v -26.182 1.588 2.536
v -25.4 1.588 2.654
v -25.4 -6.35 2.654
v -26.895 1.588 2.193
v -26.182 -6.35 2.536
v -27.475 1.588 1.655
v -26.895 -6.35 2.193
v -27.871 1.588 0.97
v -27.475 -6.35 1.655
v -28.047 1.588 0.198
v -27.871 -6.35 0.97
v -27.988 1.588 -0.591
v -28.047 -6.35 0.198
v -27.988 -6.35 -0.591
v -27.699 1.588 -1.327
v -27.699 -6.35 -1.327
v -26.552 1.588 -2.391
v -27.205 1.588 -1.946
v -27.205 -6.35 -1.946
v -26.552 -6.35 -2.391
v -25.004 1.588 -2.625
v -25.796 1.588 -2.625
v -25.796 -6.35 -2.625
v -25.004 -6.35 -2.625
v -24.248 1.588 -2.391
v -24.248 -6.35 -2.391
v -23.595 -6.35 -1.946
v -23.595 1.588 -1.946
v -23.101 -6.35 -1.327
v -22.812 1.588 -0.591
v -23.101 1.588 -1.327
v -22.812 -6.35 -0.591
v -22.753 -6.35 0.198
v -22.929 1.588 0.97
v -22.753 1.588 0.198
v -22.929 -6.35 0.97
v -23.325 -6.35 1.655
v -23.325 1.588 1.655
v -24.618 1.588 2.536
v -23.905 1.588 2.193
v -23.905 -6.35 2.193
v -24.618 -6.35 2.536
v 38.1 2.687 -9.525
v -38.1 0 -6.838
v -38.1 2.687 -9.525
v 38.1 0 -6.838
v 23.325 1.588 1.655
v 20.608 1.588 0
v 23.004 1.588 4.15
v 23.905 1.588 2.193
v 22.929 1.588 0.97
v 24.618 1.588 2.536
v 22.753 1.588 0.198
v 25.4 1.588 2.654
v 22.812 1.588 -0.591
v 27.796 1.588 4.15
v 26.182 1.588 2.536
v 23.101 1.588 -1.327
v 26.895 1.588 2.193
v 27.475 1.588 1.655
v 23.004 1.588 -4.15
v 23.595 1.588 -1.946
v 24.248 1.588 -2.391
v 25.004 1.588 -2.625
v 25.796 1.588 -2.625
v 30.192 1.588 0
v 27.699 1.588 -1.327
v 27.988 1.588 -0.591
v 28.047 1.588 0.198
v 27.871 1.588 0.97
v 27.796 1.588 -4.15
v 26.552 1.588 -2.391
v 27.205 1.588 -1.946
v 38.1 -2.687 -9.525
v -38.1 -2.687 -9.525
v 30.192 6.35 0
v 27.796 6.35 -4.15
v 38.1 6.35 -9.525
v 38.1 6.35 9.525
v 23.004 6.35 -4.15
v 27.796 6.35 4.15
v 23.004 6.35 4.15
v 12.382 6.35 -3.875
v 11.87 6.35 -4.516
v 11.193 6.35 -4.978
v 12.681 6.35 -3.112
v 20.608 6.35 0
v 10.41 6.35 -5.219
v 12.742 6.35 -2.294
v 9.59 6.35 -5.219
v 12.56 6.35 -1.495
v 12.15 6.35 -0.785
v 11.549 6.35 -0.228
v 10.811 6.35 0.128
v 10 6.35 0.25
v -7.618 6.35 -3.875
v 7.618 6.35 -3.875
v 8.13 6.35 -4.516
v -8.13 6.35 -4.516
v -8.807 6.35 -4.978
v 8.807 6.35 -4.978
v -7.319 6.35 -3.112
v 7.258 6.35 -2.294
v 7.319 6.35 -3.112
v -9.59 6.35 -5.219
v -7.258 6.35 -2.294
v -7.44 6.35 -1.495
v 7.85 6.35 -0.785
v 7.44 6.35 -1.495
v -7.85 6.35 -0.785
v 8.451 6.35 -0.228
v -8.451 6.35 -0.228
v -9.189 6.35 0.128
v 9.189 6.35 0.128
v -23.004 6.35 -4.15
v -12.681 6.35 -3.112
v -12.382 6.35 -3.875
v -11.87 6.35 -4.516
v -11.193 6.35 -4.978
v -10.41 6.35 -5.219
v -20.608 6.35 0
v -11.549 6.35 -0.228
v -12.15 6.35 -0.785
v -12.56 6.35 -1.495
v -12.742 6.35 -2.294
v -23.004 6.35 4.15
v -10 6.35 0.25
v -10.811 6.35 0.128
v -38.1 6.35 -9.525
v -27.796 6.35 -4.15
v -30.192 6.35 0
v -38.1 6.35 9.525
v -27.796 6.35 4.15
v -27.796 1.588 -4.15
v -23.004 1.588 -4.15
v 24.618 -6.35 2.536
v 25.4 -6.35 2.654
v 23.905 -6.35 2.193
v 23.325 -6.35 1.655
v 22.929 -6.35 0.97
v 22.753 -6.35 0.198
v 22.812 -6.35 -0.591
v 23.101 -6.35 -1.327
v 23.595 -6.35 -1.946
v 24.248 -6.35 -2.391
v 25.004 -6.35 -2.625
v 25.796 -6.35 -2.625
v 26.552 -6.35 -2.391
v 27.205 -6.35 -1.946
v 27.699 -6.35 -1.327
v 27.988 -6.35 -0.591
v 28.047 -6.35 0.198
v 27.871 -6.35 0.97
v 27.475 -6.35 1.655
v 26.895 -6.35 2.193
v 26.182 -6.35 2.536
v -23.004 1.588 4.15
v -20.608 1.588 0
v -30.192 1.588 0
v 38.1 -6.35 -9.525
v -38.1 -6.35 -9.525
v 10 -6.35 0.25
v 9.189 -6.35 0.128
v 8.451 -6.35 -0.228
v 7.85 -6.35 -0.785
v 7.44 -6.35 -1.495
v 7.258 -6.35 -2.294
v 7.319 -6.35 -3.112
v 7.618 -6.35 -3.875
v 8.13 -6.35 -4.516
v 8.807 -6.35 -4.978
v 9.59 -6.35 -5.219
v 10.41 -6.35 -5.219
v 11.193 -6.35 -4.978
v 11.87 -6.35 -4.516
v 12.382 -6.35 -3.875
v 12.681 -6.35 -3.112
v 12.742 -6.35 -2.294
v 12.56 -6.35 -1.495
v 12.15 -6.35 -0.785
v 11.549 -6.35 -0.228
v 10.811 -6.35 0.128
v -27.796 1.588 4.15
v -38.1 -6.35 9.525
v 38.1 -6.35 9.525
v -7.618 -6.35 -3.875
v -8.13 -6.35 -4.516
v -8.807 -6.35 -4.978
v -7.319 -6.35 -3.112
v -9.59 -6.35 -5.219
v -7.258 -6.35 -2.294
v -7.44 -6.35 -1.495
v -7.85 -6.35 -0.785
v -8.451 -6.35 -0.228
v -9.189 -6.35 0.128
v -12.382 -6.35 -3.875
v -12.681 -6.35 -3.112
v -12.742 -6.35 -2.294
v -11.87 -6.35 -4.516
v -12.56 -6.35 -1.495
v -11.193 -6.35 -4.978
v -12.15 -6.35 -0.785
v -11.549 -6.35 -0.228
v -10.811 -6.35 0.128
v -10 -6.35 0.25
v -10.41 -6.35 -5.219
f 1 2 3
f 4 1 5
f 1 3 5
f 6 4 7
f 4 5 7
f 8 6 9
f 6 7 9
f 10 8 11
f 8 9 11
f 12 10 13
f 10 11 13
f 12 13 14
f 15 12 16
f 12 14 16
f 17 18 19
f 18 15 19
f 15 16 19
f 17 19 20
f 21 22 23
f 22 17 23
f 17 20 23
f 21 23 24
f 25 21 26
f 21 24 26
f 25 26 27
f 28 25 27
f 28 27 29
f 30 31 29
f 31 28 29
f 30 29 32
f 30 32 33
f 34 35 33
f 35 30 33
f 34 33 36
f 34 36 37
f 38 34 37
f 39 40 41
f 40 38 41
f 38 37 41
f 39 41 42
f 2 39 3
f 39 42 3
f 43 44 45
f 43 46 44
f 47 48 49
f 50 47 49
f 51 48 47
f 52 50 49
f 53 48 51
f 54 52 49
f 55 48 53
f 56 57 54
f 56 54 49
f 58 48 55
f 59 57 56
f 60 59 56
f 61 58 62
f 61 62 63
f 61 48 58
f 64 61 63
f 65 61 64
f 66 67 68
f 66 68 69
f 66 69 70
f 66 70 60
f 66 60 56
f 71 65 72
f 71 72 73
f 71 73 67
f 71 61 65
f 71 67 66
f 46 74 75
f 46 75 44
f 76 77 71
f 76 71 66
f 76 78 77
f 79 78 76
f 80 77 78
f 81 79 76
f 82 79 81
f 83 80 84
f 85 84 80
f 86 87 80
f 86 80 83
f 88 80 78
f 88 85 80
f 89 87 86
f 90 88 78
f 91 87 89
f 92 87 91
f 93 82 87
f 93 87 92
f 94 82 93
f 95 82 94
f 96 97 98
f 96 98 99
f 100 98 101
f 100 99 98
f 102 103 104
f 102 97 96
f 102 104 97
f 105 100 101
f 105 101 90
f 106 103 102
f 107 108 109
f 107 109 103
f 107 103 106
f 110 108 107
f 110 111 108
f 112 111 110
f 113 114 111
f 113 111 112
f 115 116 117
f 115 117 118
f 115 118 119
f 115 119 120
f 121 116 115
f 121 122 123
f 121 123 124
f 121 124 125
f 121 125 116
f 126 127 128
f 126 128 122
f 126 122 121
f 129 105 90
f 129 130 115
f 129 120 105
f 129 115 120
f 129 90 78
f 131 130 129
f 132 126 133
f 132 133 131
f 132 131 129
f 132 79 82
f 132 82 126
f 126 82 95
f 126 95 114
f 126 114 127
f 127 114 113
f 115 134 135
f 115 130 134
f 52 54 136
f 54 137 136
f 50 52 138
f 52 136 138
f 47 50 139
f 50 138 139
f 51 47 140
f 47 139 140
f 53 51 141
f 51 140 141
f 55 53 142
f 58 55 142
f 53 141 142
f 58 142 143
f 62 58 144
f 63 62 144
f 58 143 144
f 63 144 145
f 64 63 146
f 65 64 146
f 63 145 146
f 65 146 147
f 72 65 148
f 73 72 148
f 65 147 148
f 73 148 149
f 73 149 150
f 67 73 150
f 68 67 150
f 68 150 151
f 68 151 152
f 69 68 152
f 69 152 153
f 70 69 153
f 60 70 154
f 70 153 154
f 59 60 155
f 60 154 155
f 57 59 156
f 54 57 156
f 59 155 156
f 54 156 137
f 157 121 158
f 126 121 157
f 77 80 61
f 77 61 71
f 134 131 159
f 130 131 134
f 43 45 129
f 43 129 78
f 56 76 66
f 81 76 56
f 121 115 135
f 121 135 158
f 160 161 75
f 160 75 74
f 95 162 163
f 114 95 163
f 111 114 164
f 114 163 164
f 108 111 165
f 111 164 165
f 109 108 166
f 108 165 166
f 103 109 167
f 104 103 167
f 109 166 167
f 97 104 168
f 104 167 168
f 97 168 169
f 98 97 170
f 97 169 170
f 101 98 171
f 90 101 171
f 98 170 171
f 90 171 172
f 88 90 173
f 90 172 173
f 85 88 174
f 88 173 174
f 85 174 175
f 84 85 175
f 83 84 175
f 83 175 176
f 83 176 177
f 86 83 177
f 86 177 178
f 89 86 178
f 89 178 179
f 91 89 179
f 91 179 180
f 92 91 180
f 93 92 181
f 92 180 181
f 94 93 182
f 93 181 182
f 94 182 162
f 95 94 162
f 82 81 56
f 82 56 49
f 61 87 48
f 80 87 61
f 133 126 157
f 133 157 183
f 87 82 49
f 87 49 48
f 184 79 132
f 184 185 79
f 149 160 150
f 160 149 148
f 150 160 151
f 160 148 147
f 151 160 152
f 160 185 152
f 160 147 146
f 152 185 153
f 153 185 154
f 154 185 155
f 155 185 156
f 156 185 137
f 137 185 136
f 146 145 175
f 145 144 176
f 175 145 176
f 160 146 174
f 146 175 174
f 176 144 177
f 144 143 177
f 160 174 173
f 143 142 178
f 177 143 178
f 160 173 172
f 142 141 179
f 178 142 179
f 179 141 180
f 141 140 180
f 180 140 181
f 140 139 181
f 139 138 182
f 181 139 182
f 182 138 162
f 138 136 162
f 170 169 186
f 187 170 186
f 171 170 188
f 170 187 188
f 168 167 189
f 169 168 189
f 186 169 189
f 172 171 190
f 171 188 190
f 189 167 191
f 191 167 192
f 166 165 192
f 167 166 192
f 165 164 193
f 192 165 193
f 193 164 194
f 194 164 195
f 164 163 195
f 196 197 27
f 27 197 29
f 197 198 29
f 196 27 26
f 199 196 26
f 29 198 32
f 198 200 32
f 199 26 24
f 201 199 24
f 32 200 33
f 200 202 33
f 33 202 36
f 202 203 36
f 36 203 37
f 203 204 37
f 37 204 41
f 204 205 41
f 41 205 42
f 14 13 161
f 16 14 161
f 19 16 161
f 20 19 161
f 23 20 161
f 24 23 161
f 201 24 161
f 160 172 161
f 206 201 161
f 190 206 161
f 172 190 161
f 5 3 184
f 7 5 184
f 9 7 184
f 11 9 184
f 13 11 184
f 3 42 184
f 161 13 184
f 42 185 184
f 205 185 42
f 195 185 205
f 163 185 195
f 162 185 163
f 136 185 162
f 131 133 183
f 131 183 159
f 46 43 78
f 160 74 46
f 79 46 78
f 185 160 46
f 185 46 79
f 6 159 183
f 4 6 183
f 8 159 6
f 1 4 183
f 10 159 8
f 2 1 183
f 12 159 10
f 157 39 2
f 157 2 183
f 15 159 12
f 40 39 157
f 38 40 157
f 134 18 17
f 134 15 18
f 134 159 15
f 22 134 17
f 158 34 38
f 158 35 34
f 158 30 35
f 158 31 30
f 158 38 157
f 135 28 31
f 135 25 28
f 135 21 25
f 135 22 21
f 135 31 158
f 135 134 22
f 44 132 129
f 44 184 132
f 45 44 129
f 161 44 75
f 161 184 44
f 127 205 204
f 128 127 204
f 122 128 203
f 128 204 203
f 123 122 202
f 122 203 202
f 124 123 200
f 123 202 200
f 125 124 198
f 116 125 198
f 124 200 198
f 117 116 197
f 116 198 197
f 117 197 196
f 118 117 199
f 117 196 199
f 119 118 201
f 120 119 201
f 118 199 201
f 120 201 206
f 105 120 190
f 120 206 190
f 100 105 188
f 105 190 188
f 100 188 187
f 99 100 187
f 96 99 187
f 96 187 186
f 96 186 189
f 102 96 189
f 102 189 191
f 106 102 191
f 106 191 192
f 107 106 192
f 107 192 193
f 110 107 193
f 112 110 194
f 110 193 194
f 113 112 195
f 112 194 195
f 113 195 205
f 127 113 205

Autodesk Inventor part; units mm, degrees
ref_plane "YZ Plane" through (0, 0, 0) normal (1, 0, 0) x (0, 1, 0)
ref_plane "XZ Plane" through (0, 0, 0) normal (0, 1, 0) x (-1, 0, 0)
ref_plane "XY Plane" through (0, 0, 0) normal (0, 0, 1) x (1, 0, 0)
sketch "Sketch1" plane through (0, 0, 0) normal (0, 1, 0) x (-1, 0, 0)
  line L0 (-38.1, 9.525) -> (38.1, 9.525)
  line L1 (38.1, 9.525) -> (38.1, -9.525)
  line L2 (38.1, -9.525) -> (-38.1, -9.525)
  line L3 (-38.1, -9.525) -> (-38.1, 9.525)
  line L4 (-38.1, 9.525) -> (38.1, -9.525) construction
  line L5 (38.1, 9.525) -> (-38.1, -9.525) construction
  point P0 (0, 0)
  dimension "d0" = 76.2
  dimension "d1" = 19.05
extrude "Extrusion1" add sketch "Sketch1" along normal mid plane 12.7
sketch "Sketch2" plane through (38.1, -6.35, -9.525) normal (1, 0, 0) x (0, 0, -1)
  line L0 (0, 3.663) -> (-2.687, 6.35)
  line L1 (-2.687, 6.35) -> (0, 9.037)
  line L2 (0, 9.037) -> (2.687, 6.35)
  line L3 (2.687, 6.35) -> (0, 3.663)
  line L4 (-19.05, 12.7) -> (0, 12.7) projected
  line L5 (0, 12.7) -> (0, 0) projected
  point P0 (-9.525, 6.35)
  point P1 (0, 6.35)
  dimension "d4" = 45
  dimension "d5" = 3.8
extrude "Extrusion2" cut sketch "Sketch2" against normal through all
sketch "Sketch5" plane through (0, 6.35, 0) normal (0, 1, 0) x (1, 0, 0)
  line L0 (-38.1, 9.525) -> (-38.1, -9.525) projected
  line L1 (38.1, -9.525) -> (38.1, 9.525) projected
  point P0 (0, 0)
  point P1 (-25.4, 0)
  point P2 (25.4, 0)
  dimension "d18" = 12.7
  dimension "d19" = 12.7
hole "Hole1" at (-25.4, 6.35, 0) at (25.4, 6.35, 0) direction (0, -1, 0) diameter 5.3086 end through all clearance for "Flat Head Machine Screw" size "M5" standard "Ansi Metric M Profile"
sketch "Sketch6" plane through (0, 6.35, 0) normal (0, 1, 0) x (1, 0, 0)
  line L0 (-38.1, 9.525) -> (-38.1, -9.525) projected
  line L1 (38.1, -9.525) -> (38.1, 9.525) projected
  line L2 (-38.1, -9.525) -> (38.1, -9.525) projected
  line L3 (38.1, 6.838) -> (-38.1, 6.838) projected
  circle A0 centre (-25.4, 0) radius 2.6543 projected
  point P0 (0, 0)
  point P1 (-10, 2.5)
  point P2 (10, 2.5)
  dimension "d27" = 28.1
  dimension "d28" = 28.1
  dimension "d38" = 2.5
hole "Hole2" at (-10, 6.35, -2.5) at (10, 6.35, -2.5) direction (0, -1, 0) diameter 5.5 end through all
sketch "Sketch7" plane through (0, 6.35, 0) normal (0, 1, 0) x (1, 0, 0)
  circle A0 centre (-25.4, 0) radius 2.6543 projected
  circle A1 centre (25.4, 0) radius 2.6543 projected
  line L0 (-23.004, 4.15) -> (-20.608, 0)
  line L1 (-20.608, 0) -> (-23.004, -4.15)
  line L2 (-23.004, -4.15) -> (-27.796, -4.15)
  line L3 (-27.796, -4.15) -> (-30.192, 0)
  line L4 (-30.192, 0) -> (-27.796, 4.15)
  line L5 (-27.796, 4.15) -> (-23.004, 4.15)
  line L6 (23.004, -4.15) -> (20.608, 0)
  line L7 (20.608, 0) -> (23.004, 4.15)
  line L8 (23.004, 4.15) -> (27.796, 4.15)
  line L9 (27.796, 4.15) -> (30.192, 0)
  line L10 (30.192, 0) -> (27.796, -4.15)
  line L11 (27.796, -4.15) -> (23.004, -4.15)
  point P0 (0, 0)
  dimension "d39" = 8.3
  dimension "d40" = 8.3
extrude "Extrusion5" cut sketch "Sketch7" against normal blind 4.7625 contours A1 | L0 L1 L2 L3 L4 L5 | L6 L7 L8 L9 L10 L11
equation "\"d28\" = d27"
equation "\"d40\" = d39"
properties part number "X-Axis_Mount_Slide_LM3005" material "Acetal Resin, White"
